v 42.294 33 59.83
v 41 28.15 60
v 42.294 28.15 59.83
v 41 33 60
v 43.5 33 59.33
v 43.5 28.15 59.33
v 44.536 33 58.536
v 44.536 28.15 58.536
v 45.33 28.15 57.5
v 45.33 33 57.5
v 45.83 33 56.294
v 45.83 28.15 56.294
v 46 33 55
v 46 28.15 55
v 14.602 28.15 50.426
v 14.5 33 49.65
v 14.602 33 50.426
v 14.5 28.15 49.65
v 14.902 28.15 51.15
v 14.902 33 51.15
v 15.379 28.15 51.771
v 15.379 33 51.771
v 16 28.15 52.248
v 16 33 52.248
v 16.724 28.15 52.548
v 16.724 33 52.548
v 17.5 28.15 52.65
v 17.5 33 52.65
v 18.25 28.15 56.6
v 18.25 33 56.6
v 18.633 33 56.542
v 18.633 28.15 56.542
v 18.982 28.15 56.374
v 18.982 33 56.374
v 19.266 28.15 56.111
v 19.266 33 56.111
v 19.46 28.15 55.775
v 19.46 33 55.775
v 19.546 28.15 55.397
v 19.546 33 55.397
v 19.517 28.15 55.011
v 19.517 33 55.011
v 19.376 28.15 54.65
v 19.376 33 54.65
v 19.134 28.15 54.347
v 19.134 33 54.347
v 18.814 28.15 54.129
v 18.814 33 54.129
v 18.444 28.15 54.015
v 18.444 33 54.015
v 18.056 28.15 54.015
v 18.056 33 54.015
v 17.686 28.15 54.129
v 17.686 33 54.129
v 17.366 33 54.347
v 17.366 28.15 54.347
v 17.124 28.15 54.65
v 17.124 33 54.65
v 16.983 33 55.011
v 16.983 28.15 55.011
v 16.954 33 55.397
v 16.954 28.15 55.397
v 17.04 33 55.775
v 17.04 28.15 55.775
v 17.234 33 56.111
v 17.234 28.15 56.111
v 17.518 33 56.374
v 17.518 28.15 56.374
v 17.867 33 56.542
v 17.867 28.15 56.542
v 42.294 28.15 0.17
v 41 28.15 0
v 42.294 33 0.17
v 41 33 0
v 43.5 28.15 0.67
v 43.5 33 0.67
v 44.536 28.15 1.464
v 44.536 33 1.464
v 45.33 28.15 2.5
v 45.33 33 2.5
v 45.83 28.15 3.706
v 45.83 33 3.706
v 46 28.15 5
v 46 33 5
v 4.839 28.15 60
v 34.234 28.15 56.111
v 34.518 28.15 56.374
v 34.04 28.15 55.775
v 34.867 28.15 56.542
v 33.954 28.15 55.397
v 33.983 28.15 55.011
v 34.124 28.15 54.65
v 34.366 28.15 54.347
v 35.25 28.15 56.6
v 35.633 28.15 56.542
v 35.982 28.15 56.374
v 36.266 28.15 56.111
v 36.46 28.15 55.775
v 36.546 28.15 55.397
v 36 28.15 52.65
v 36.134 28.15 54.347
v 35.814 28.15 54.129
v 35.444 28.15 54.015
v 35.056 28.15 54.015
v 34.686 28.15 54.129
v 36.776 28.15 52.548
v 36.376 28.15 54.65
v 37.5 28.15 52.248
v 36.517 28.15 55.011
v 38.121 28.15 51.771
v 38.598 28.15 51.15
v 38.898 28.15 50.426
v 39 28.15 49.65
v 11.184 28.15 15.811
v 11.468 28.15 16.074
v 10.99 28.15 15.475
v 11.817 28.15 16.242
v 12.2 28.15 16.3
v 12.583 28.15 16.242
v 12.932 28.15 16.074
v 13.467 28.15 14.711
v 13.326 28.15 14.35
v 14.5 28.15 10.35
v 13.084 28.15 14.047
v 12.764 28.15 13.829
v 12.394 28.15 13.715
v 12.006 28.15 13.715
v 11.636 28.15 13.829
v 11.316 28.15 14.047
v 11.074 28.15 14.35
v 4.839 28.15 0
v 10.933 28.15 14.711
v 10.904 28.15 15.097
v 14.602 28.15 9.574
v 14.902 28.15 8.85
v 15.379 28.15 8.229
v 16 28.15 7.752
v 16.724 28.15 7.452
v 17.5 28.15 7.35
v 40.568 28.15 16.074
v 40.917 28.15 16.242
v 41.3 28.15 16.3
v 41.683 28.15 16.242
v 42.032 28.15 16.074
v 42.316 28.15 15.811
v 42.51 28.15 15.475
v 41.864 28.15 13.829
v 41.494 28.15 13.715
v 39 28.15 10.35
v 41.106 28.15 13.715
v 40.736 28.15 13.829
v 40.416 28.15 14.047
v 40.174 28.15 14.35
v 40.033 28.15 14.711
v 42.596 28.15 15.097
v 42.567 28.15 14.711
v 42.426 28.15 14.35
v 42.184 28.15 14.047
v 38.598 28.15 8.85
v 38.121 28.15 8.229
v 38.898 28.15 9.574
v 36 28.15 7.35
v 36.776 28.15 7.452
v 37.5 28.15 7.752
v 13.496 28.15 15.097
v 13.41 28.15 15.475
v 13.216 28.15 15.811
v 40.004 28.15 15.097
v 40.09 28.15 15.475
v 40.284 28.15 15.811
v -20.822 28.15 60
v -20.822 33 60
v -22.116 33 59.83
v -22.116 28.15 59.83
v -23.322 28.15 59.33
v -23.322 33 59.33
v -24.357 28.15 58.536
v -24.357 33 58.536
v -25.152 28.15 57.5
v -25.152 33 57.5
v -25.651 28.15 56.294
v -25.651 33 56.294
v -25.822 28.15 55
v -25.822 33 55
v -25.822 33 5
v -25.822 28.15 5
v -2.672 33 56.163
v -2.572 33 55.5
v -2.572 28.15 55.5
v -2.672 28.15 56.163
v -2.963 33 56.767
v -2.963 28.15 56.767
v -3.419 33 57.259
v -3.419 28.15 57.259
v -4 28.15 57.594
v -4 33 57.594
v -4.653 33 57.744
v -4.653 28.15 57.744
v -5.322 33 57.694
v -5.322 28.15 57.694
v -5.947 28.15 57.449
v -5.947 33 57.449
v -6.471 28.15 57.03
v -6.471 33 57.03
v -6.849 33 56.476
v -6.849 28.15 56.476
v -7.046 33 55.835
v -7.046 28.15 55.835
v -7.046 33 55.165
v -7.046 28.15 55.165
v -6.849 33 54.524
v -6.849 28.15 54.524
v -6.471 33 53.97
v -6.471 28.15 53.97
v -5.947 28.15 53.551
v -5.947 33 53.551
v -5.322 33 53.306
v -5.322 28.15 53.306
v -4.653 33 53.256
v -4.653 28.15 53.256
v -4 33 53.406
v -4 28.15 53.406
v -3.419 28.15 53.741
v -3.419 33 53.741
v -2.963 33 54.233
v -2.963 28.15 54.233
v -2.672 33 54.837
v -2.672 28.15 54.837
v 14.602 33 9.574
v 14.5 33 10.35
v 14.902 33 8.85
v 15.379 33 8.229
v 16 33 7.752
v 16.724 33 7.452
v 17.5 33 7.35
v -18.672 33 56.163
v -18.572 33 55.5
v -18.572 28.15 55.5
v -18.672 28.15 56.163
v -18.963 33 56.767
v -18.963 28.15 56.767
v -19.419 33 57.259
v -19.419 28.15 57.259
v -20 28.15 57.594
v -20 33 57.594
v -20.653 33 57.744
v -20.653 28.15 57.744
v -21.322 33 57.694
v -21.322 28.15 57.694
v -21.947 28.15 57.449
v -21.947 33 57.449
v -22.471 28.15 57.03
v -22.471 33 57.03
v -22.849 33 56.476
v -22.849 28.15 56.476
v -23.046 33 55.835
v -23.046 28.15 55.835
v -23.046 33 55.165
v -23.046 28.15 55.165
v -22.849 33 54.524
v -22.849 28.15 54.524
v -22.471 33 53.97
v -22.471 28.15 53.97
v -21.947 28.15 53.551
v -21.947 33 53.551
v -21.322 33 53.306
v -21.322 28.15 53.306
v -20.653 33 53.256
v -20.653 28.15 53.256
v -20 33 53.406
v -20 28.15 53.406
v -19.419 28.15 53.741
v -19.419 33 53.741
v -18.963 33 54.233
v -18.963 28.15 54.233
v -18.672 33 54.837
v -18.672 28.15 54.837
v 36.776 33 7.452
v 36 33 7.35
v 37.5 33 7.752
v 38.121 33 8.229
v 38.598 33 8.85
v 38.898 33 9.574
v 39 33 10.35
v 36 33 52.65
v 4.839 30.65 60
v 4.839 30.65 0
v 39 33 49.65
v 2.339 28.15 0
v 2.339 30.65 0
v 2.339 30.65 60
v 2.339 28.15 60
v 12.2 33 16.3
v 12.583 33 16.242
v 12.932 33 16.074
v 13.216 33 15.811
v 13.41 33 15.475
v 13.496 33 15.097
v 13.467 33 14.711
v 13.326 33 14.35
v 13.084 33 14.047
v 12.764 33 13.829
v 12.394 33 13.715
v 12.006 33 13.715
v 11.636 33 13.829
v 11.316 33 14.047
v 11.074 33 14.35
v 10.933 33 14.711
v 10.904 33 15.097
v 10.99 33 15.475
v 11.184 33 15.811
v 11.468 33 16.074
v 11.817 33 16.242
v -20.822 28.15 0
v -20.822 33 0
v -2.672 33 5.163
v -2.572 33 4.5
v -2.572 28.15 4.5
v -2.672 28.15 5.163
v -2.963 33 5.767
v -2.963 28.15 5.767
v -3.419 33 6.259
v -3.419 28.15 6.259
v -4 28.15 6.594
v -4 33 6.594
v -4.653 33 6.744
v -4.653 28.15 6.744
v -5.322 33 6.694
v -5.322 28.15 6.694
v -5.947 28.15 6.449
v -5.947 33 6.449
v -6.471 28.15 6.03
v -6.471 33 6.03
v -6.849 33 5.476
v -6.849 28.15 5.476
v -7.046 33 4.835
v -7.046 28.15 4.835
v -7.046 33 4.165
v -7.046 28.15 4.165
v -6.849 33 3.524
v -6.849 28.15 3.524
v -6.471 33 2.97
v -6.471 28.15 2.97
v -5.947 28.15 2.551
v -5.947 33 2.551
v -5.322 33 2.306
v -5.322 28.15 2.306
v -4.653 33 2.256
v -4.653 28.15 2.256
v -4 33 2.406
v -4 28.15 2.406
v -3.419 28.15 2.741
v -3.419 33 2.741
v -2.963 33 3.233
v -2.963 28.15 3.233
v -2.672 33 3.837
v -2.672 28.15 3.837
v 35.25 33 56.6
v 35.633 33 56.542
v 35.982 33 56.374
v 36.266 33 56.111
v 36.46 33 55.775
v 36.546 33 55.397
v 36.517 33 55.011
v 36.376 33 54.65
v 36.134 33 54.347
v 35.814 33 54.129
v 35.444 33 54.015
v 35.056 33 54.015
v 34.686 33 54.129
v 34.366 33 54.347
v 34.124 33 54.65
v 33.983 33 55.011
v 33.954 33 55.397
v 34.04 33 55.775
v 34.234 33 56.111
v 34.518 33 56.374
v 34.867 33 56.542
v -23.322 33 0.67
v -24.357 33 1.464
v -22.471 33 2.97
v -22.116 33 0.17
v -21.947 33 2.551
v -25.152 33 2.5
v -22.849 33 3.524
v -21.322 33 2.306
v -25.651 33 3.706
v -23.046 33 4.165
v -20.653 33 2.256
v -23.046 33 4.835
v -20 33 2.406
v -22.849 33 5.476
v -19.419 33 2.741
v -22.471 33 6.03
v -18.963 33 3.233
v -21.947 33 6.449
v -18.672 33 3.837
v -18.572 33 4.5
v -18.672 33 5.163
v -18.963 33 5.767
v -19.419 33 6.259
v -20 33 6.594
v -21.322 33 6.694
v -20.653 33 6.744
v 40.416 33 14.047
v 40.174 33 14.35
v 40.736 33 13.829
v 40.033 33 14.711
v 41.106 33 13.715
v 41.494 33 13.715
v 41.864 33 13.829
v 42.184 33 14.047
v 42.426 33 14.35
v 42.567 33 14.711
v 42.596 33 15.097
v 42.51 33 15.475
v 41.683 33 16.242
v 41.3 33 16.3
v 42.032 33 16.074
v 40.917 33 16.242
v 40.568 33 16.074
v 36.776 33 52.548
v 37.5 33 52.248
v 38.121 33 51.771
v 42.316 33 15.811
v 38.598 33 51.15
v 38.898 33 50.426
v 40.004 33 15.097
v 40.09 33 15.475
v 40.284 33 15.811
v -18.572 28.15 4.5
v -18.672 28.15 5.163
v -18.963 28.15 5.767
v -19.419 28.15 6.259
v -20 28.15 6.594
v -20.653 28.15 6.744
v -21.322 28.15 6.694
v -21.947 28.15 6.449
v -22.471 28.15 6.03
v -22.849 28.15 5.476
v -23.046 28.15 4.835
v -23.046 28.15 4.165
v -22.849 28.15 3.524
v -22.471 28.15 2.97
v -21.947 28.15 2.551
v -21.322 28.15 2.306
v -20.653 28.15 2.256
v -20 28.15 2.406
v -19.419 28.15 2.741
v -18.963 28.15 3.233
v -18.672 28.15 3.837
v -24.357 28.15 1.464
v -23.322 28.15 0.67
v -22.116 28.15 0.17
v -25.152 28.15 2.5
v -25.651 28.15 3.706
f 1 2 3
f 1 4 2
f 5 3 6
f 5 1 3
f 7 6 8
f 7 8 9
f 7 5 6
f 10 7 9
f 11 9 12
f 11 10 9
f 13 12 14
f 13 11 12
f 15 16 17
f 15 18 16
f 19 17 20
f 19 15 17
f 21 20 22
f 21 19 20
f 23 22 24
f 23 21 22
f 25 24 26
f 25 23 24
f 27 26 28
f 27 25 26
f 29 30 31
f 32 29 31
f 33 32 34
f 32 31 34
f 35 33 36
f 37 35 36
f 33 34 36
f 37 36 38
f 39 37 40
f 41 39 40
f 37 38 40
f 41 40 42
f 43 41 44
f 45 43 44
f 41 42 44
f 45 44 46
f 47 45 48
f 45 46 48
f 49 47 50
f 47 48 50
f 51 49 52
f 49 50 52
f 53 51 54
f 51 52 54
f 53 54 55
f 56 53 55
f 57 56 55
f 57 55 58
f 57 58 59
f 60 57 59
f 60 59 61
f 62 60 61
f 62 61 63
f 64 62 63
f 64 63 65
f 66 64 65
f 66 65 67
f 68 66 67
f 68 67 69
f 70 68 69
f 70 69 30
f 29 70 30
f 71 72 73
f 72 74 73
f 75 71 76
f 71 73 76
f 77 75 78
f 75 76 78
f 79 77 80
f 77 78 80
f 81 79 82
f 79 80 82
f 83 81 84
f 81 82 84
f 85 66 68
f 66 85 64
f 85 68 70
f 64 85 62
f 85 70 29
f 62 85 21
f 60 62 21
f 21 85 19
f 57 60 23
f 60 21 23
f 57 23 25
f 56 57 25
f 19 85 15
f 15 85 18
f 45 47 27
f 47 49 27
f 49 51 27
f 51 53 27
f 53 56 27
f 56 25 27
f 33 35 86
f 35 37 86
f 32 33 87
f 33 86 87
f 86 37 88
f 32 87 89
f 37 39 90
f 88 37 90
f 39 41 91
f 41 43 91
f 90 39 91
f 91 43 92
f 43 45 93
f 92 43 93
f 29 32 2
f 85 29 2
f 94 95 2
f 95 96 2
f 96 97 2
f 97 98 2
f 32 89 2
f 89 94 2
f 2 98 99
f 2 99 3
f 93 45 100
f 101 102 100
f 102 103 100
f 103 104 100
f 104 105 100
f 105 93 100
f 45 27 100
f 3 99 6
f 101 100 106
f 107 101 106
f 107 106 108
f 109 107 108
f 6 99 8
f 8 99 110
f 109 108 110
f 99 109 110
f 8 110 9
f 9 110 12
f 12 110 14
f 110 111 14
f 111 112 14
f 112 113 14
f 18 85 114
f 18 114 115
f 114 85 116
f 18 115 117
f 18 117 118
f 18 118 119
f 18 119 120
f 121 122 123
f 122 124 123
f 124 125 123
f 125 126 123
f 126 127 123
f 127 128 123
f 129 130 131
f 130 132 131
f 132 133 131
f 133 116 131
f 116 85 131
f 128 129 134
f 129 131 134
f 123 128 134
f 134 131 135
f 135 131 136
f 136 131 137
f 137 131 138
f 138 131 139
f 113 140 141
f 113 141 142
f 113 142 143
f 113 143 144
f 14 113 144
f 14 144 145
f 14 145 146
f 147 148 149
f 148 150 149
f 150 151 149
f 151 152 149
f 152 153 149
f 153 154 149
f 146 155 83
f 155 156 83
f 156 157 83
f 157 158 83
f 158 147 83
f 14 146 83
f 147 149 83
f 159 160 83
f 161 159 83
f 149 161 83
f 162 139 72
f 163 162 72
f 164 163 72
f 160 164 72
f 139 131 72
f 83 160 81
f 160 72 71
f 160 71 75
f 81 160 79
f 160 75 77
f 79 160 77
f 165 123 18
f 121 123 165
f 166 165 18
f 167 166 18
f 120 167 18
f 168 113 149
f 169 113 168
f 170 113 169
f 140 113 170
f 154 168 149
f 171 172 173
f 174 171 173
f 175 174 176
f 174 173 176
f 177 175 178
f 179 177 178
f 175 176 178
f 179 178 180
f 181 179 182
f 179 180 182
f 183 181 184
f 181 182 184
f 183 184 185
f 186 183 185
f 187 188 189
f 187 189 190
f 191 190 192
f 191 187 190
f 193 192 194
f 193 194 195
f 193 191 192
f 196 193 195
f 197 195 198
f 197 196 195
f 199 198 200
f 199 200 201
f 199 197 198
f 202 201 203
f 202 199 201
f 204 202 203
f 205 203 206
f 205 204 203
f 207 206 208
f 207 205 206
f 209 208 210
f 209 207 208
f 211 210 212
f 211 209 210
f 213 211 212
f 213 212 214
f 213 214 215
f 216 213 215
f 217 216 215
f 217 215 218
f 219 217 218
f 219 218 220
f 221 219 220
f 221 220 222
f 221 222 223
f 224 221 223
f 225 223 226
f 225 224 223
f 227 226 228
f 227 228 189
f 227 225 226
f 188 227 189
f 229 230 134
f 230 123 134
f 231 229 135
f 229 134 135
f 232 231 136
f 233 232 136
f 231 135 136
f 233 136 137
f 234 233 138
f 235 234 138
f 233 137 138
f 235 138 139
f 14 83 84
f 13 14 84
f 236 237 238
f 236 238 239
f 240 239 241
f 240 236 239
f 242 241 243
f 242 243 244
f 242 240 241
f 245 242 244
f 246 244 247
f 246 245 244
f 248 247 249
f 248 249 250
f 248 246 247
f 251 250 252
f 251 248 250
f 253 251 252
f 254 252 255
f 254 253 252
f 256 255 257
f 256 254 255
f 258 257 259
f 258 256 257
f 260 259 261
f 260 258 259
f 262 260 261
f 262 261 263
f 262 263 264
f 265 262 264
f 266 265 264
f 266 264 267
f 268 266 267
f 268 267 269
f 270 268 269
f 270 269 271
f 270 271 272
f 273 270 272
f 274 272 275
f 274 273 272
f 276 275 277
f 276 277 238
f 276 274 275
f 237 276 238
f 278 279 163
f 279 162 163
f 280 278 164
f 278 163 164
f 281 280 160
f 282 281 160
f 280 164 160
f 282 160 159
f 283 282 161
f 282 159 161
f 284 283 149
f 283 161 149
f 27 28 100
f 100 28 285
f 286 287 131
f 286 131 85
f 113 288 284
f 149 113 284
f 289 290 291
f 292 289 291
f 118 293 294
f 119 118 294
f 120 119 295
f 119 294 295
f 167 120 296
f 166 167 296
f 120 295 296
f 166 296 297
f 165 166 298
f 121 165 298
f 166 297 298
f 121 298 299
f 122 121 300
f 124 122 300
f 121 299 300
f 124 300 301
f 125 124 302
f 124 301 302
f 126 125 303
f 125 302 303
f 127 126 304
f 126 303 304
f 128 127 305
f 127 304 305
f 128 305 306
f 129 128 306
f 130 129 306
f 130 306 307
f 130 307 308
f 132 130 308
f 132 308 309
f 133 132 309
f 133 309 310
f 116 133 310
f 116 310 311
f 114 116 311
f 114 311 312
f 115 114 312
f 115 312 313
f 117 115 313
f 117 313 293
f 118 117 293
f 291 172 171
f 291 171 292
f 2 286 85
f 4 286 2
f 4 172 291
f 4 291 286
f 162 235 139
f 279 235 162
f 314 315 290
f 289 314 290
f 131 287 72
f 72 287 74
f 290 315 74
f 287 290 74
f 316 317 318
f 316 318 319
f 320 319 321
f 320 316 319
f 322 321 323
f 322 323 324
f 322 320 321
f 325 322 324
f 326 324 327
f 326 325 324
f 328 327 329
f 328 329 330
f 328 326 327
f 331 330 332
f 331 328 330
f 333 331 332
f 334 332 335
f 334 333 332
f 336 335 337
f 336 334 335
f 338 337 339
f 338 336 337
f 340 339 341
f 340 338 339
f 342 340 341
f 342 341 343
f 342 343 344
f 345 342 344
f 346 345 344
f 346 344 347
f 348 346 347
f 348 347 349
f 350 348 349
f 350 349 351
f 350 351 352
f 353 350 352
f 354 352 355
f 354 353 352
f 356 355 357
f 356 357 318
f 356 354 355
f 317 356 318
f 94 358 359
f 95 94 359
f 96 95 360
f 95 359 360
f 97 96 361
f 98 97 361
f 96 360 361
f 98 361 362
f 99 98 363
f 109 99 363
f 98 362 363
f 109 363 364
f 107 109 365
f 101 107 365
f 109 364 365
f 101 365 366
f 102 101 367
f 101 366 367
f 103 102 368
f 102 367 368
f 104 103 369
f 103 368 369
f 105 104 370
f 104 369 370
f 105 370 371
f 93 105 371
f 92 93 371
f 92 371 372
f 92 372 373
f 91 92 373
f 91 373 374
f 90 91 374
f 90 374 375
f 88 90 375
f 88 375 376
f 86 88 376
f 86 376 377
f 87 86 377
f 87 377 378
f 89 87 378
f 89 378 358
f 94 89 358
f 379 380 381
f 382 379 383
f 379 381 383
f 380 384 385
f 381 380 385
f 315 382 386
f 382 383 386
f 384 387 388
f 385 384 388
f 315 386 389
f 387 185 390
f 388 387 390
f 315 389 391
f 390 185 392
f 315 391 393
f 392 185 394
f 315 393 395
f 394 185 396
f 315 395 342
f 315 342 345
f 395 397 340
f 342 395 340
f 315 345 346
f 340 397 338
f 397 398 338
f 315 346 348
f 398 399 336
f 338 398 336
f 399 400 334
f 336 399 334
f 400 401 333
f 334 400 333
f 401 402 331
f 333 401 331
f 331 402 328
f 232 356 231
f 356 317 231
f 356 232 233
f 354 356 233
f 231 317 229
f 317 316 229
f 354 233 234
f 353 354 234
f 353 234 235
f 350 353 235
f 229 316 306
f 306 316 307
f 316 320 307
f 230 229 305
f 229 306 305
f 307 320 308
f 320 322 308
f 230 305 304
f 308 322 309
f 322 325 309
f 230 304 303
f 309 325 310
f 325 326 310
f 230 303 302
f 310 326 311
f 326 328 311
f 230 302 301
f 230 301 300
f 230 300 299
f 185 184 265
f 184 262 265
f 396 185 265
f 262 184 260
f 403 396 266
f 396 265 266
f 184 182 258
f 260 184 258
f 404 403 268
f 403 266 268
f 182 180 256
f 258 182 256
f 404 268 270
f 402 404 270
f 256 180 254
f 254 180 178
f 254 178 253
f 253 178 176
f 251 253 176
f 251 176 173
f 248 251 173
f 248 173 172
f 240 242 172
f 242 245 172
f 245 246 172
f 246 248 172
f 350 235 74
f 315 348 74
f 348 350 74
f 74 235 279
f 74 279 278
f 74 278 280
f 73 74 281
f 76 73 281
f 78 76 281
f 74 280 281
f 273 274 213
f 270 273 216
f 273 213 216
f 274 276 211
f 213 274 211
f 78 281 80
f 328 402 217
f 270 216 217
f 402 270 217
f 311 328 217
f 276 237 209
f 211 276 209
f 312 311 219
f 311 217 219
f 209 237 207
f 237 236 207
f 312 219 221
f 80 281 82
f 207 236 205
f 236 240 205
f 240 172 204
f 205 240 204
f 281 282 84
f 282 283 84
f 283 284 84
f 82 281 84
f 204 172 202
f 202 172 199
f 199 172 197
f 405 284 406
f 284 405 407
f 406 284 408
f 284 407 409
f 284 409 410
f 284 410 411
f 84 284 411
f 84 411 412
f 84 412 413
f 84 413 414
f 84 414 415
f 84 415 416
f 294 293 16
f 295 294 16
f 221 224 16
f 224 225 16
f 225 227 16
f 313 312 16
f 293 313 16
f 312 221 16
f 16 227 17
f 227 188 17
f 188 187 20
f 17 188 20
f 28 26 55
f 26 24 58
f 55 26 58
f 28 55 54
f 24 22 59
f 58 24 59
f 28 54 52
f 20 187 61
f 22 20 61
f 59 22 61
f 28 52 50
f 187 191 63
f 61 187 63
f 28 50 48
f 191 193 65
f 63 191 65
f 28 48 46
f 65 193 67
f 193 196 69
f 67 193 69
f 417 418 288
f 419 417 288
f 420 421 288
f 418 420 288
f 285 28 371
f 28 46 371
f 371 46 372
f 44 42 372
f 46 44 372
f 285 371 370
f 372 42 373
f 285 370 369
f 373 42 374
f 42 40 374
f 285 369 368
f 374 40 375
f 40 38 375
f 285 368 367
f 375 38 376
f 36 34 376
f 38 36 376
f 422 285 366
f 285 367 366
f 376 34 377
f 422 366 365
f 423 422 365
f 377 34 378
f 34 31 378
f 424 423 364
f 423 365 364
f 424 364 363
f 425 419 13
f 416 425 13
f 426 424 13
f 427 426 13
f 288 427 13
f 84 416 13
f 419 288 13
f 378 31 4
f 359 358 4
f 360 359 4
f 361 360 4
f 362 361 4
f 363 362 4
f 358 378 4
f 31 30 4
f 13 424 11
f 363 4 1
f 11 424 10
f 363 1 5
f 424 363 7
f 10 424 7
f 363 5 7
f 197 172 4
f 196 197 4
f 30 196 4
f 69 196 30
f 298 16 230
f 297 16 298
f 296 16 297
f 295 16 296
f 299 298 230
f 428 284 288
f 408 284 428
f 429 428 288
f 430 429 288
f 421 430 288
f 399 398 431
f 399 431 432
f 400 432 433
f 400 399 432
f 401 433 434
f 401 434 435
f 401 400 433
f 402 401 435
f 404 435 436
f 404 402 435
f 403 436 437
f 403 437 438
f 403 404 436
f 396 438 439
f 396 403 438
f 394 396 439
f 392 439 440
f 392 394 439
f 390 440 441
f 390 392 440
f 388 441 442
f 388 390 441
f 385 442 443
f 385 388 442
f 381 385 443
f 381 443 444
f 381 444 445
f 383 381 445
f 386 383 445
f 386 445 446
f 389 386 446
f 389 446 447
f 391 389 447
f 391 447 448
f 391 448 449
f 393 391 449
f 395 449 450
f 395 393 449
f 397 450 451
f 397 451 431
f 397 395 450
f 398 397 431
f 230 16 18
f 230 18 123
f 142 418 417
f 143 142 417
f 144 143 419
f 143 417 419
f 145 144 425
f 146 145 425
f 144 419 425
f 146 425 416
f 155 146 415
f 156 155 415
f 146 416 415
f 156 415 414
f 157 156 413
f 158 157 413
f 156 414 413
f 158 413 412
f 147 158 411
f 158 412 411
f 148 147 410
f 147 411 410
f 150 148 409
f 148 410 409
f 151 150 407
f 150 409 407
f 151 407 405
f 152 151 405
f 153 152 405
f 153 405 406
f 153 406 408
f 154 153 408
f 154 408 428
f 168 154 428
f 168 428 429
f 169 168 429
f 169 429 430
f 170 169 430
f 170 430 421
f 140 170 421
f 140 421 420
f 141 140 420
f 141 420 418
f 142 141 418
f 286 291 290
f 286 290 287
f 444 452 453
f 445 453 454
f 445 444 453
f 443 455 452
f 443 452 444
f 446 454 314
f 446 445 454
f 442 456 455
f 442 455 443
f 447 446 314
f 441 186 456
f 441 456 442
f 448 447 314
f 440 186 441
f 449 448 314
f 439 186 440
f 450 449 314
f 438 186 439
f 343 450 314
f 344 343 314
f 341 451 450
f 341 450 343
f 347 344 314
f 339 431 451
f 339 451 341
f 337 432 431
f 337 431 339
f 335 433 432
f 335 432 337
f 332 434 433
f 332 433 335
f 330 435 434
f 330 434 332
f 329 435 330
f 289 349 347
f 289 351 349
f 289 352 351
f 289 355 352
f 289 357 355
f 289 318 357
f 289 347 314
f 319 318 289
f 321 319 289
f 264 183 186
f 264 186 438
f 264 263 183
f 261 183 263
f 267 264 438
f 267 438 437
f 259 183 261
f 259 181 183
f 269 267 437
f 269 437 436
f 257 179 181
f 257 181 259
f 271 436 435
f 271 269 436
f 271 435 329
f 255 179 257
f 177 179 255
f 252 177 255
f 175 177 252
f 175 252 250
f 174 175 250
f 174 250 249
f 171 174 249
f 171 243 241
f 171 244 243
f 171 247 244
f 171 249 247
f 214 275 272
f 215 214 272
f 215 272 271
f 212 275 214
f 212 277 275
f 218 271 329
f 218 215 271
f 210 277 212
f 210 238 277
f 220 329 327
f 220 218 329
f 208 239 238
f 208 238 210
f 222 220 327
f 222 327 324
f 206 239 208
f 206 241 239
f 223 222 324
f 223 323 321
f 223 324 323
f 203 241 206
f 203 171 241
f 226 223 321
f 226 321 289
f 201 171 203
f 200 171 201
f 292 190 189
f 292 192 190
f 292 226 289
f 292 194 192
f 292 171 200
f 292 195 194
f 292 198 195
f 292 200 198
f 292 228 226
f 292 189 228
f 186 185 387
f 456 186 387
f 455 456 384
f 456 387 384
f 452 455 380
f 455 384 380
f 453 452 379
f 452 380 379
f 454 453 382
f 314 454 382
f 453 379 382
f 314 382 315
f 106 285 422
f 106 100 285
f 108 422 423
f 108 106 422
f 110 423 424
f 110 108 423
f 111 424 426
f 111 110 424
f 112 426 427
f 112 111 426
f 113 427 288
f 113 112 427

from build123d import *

# Parameters (mm, degrees)
T_LE_DE_BASE_PLI_E1_DEPTH     = 60
ENL_V_MAT_EXTRU_1_REACH       = 84.492
ESQUISSE7_W                   = 24.5
ESQUISSE7_H                   = 45.3
ENL_V_MAT_EXTRU_2_REACH       = 84.492
ESQUISSE8_R                   = 1.3
ENL_V_MAT_EXTRU_3_REACH       = 81.889
ESQUISSE9_R                   = 2.25
CONG_1_R                      = 3
CONG_2_R                      = 5
ENL_V_MAT_EXTRU_4_OUTLINE_W   = 9
ENL_V_MAT_EXTRU_4_OUTLINE_H   = 60
ENL_V_MAT_EXTRU_4_DEPTH       = 28.15
ENL_V_START                   = -2.5
ENL_V_MAT_EXTRU_4_2_OUTLINE_W = 2.5
ENL_V_MAT_EXTRU_4_2_OUTLINE_H = 60
ENL_V_MAT_EXTRU_4_2_DEPTH     = 2.5
ENL_V_START_2                 = -4.85
ENL_V_MAT_EXTRU_4_3_OUTLINE_R = 2.25
ENL_V_MAT_EXTRU_4_3_OUTLINE_W = 4.160785036
ENL_V_MAT_EXTRU_4_3_OUTLINE_H = 60
ENL_V_MAT_EXTRU_4_3_DEPTH     = 4.85
ENL_V_MAT_EXTRU_4_4_OUTLINE_W = 2.5
ENL_V_MAT_EXTRU_4_4_OUTLINE_H = 60
ENL_V_MAT_EXTRU_4_4_DEPTH     = 2.35


# Read off the part's stored shape, not the designer's step: Tôle de base pliée1, Enlèv. mat.-Extru.4
with BuildPart() as part:
    # Tôle de base pliée1 outline → Tôle de base pliée1 (new body)
    with BuildSketch(Plane.XY):
        with BuildLine():
            Line((7.85, 28.15), (46, 28.15))
            Line((46, 28.15), (46, 33))
            Line((46, 33), (7.85, 33))
            ThreePointArc((7.85, 33), (2.299211768, 30.700788232), (0, 25.15))
            Line((0, 25.15), (0, 0))
            Line((0, 0), (4.85, 0))
            Line((4.85, 0), (4.85, 25.15))
            ThreePointArc((4.85, 25.15), (5.728679656, 27.271320344), (7.85, 28.15))
        make_face()
    extrude(amount=T_LE_DE_BASE_PLI_E1_DEPTH)

    # Esquisse7 → Enlèv. mat.-Extru.1 (cut, up to next)
    with BuildSketch(Plane(origin=(0, 33, 0), x_dir=(1, 0, 0), z_dir=(0, 1, 0)), mode=Mode.PRIVATE) as enl_v_mat_extru_1_sk1:
        with Locations((26.75, -30)):
            Rectangle(ESQUISSE7_W, ESQUISSE7_H)
    enl_v_mat_extru_1_tool1 = extrude(enl_v_mat_extru_1_sk1.sketch, amount=-ENL_V_MAT_EXTRU_1_REACH, mode=Mode.PRIVATE) & part.part
    add(enl_v_mat_extru_1_tool1.solids().sort_by_distance((26.75, 33, 30))[0], mode=Mode.SUBTRACT)

    # Esquisse8 → Enlèv. mat.-Extru.2 (cut, up to next)
    with BuildSketch(Plane(origin=(0, 33, 0), x_dir=(1, 0, 0), z_dir=(0, 1, 0)), mode=Mode.PRIVATE) as enl_v_mat_extru_2_sk1:
        with Locations(Location((18.25, -55.3, 0), (0, 0, 270))):
            Circle(ESQUISSE8_R)
    enl_v_mat_extru_2_tool1 = extrude(enl_v_mat_extru_2_sk1.sketch, amount=-ENL_V_MAT_EXTRU_2_REACH, mode=Mode.PRIVATE) & part.part
    # Esquisse8 → Enlèv. mat.-Extru.2 (cut, up to next)
    with BuildSketch(Plane(origin=(0, 33, 0), x_dir=(1, 0, 0), z_dir=(0, 1, 0)), mode=Mode.PRIVATE) as enl_v_mat_extru_2_sk2:
        with Locations(Location((35.25, -55.3, 0), (0, 0, 270))):
            Circle(ESQUISSE8_R)
    enl_v_mat_extru_2_tool2 = extrude(enl_v_mat_extru_2_sk2.sketch, amount=-ENL_V_MAT_EXTRU_2_REACH, mode=Mode.PRIVATE) & part.part
    # Esquisse8 → Enlèv. mat.-Extru.2 (cut, up to next)
    with BuildSketch(Plane(origin=(0, 33, 0), x_dir=(1, 0, 0), z_dir=(0, 1, 0)), mode=Mode.PRIVATE) as enl_v_mat_extru_2_sk3:
        with Locations(Location((41.3, -15, 0), (0, 0, 270))):
            Circle(ESQUISSE8_R)
    enl_v_mat_extru_2_tool3 = extrude(enl_v_mat_extru_2_sk3.sketch, amount=-ENL_V_MAT_EXTRU_2_REACH, mode=Mode.PRIVATE) & part.part
    # Esquisse8 → Enlèv. mat.-Extru.2 (cut, up to next)
    with BuildSketch(Plane(origin=(0, 33, 0), x_dir=(1, 0, 0), z_dir=(0, 1, 0)), mode=Mode.PRIVATE) as enl_v_mat_extru_2_sk4:
        with Locations(Location((12.2, -15, 0), (0, 0, 270))):
            Circle(ESQUISSE8_R)
    enl_v_mat_extru_2_tool4 = extrude(enl_v_mat_extru_2_sk4.sketch, amount=-ENL_V_MAT_EXTRU_2_REACH, mode=Mode.PRIVATE) & part.part
    add(enl_v_mat_extru_2_tool1.solids().sort_by_distance((18.25, 33, 55.3))[0], mode=Mode.SUBTRACT)
    add(enl_v_mat_extru_2_tool2.solids().sort_by_distance((35.25, 33, 55.3))[0], mode=Mode.SUBTRACT)
    add(enl_v_mat_extru_2_tool3.solids().sort_by_distance((41.3, 33, 15))[0], mode=Mode.SUBTRACT)
    add(enl_v_mat_extru_2_tool4.solids().sort_by_distance((12.2, 33, 15))[0], mode=Mode.SUBTRACT)

    # Esquisse9 → Enlèv. mat.-Extru.3 (cut, up to next)
    with BuildSketch(Plane(origin=(4.85, 0, 0), x_dir=(0, 0, -1), z_dir=(1, 0, 0)), mode=Mode.PRIVATE) as enl_v_mat_extru_3_sk1:
        with Locations((-4.5, 5)):
            Circle(ESQUISSE9_R)
    enl_v_mat_extru_3_tool1 = extrude(enl_v_mat_extru_3_sk1.sketch, amount=-ENL_V_MAT_EXTRU_3_REACH, mode=Mode.PRIVATE) & part.part
    # Esquisse9 → Enlèv. mat.-Extru.3 (cut, up to next)
    with BuildSketch(Plane(origin=(4.85, 0, 0), x_dir=(0, 0, -1), z_dir=(1, 0, 0)), mode=Mode.PRIVATE) as enl_v_mat_extru_3_sk2:
        with Locations(Location((-4.5, 21, 0), (0, 0, 180))):
            Circle(ESQUISSE9_R)
    enl_v_mat_extru_3_tool2 = extrude(enl_v_mat_extru_3_sk2.sketch, amount=-ENL_V_MAT_EXTRU_3_REACH, mode=Mode.PRIVATE) & part.part
    # Esquisse9 → Enlèv. mat.-Extru.3 (cut, up to next)
    with BuildSketch(Plane(origin=(4.85, 0, 0), x_dir=(0, 0, -1), z_dir=(1, 0, 0)), mode=Mode.PRIVATE) as enl_v_mat_extru_3_sk3:
        with Locations((-55.5, 21)):
            Circle(ESQUISSE9_R)
    enl_v_mat_extru_3_tool3 = extrude(enl_v_mat_extru_3_sk3.sketch, amount=-ENL_V_MAT_EXTRU_3_REACH, mode=Mode.PRIVATE) & part.part
    # Esquisse9 → Enlèv. mat.-Extru.3 (cut, up to next)
    with BuildSketch(Plane(origin=(4.85, 0, 0), x_dir=(0, 0, -1), z_dir=(1, 0, 0)), mode=Mode.PRIVATE) as enl_v_mat_extru_3_sk4:
        with Locations(Location((-55.5, 5, 0), (0, 0, 180))):
            Circle(ESQUISSE9_R)
    enl_v_mat_extru_3_tool4 = extrude(enl_v_mat_extru_3_sk4.sketch, amount=-ENL_V_MAT_EXTRU_3_REACH, mode=Mode.PRIVATE) & part.part
    add(enl_v_mat_extru_3_tool1.solids().sort_by_distance((4.85, 5, 4.5))[0], mode=Mode.SUBTRACT)
    add(enl_v_mat_extru_3_tool2.solids().sort_by_distance((4.85, 21, 4.5))[0], mode=Mode.SUBTRACT)
    add(enl_v_mat_extru_3_tool3.solids().sort_by_distance((4.85, 21, 55.5))[0], mode=Mode.SUBTRACT)
    add(enl_v_mat_extru_3_tool4.solids().sort_by_distance((4.85, 5, 55.5))[0], mode=Mode.SUBTRACT)

    # Congé1
    cong_1_edges = [part.edges().sort_by_distance(p)[0] for p in [
        (14.5, 30.575, 52.65),
        (14.5, 30.575, 7.35),
        (39, 30.575, 7.35),
        (39, 30.575, 52.65),
    ]]
    fillet(cong_1_edges, radius=CONG_1_R)

    # Congé2
    cong_2_edges = [part.edges().sort_by_distance(p)[0] for p in [
        (2.425, 0, 60),
        (46, 30.575, 60),
        (2.425, 0, 0),
        (46, 30.575, 0),
    ]]
    fillet(cong_2_edges, radius=CONG_2_R)

    # Enlèv. mat.-Extru.4 outline → Enlèv. mat.-Extru.4 (cut)
    with BuildSketch(Plane.XZ.offset(-28.15)):
        with Locations((4.5, 30)):
            Rectangle(ENL_V_MAT_EXTRU_4_OUTLINE_W, ENL_V_MAT_EXTRU_4_OUTLINE_H)
    extrude(amount=ENL_V_MAT_EXTRU_4_DEPTH, mode=Mode.SUBTRACT)

    # Enl_v. mat.-Extru.4 2 outline → Enl_v. mat.-Extru.4 2 (cut)
    with BuildSketch(Plane.XZ.offset(-28.15).offset(ENL_V_START)):
        with Locations((3.589214964, 30)):
            Rectangle(ENL_V_MAT_EXTRU_4_2_OUTLINE_W, ENL_V_MAT_EXTRU_4_2_OUTLINE_H)
    extrude(amount=ENL_V_MAT_EXTRU_4_2_DEPTH, mode=Mode.SUBTRACT)

    # Enl_v. mat.-Extru.4 3 outline → Enl_v. mat.-Extru.4 3 (add)
    # profile 1 of 2: a face of its own
    with BuildSketch(Plane.XZ.offset(-28.15).offset(ENL_V_START_2)):
        with BuildLine():
            ThreePointArc((-25.821570073, 5), (-24.357103979, 1.464466094), (-20.821570073, 0))
            Line((-20.821570073, 0), (2.339214964, 0))
            Line((2.339214964, 0), (2.339214964, 60))
            Line((2.339214964, 60), (-20.821570073, 60))
            ThreePointArc((-20.821570073, 60), (-24.357103979, 58.535533906), (-25.821570073, 55))
            Line((-25.821570073, 55), (-25.821570073, 5))
        make_face()
        with Locations((-20.821570073, 4.5)):
            Circle(ENL_V_MAT_EXTRU_4_3_OUTLINE_R, mode=Mode.SUBTRACT)
        with Locations((-4.821570073, 4.5)):
            Circle(ENL_V_MAT_EXTRU_4_3_OUTLINE_R, mode=Mode.SUBTRACT)
        with Locations((-20.821570073, 55.5)):
            Circle(ENL_V_MAT_EXTRU_4_3_OUTLINE_R, mode=Mode.SUBTRACT)
        with Locations((-4.821570073, 55.5)):
            Circle(ENL_V_MAT_EXTRU_4_3_OUTLINE_R, mode=Mode.SUBTRACT)
    # profile 2 of 2: a face of its own
    with BuildSketch(Plane.XZ.offset(-28.15).offset(ENL_V_START_2)):
        with Locations((6.919607482, 30)):
            Rectangle(ENL_V_MAT_EXTRU_4_3_OUTLINE_W, ENL_V_MAT_EXTRU_4_3_OUTLINE_H)
    extrude(amount=ENL_V_MAT_EXTRU_4_3_DEPTH)

    # Enl_v. mat.-Extru.4 4 outline → Enl_v. mat.-Extru.4 4 (add)
    with BuildSketch(Plane.XZ.offset(-28.15).offset(ENL_V_START_2)):
        with Locations((3.589214964, 30)):
            Rectangle(ENL_V_MAT_EXTRU_4_4_OUTLINE_W, ENL_V_MAT_EXTRU_4_4_OUTLINE_H)
    extrude(amount=ENL_V_MAT_EXTRU_4_4_DEPTH)


solid = part.part
